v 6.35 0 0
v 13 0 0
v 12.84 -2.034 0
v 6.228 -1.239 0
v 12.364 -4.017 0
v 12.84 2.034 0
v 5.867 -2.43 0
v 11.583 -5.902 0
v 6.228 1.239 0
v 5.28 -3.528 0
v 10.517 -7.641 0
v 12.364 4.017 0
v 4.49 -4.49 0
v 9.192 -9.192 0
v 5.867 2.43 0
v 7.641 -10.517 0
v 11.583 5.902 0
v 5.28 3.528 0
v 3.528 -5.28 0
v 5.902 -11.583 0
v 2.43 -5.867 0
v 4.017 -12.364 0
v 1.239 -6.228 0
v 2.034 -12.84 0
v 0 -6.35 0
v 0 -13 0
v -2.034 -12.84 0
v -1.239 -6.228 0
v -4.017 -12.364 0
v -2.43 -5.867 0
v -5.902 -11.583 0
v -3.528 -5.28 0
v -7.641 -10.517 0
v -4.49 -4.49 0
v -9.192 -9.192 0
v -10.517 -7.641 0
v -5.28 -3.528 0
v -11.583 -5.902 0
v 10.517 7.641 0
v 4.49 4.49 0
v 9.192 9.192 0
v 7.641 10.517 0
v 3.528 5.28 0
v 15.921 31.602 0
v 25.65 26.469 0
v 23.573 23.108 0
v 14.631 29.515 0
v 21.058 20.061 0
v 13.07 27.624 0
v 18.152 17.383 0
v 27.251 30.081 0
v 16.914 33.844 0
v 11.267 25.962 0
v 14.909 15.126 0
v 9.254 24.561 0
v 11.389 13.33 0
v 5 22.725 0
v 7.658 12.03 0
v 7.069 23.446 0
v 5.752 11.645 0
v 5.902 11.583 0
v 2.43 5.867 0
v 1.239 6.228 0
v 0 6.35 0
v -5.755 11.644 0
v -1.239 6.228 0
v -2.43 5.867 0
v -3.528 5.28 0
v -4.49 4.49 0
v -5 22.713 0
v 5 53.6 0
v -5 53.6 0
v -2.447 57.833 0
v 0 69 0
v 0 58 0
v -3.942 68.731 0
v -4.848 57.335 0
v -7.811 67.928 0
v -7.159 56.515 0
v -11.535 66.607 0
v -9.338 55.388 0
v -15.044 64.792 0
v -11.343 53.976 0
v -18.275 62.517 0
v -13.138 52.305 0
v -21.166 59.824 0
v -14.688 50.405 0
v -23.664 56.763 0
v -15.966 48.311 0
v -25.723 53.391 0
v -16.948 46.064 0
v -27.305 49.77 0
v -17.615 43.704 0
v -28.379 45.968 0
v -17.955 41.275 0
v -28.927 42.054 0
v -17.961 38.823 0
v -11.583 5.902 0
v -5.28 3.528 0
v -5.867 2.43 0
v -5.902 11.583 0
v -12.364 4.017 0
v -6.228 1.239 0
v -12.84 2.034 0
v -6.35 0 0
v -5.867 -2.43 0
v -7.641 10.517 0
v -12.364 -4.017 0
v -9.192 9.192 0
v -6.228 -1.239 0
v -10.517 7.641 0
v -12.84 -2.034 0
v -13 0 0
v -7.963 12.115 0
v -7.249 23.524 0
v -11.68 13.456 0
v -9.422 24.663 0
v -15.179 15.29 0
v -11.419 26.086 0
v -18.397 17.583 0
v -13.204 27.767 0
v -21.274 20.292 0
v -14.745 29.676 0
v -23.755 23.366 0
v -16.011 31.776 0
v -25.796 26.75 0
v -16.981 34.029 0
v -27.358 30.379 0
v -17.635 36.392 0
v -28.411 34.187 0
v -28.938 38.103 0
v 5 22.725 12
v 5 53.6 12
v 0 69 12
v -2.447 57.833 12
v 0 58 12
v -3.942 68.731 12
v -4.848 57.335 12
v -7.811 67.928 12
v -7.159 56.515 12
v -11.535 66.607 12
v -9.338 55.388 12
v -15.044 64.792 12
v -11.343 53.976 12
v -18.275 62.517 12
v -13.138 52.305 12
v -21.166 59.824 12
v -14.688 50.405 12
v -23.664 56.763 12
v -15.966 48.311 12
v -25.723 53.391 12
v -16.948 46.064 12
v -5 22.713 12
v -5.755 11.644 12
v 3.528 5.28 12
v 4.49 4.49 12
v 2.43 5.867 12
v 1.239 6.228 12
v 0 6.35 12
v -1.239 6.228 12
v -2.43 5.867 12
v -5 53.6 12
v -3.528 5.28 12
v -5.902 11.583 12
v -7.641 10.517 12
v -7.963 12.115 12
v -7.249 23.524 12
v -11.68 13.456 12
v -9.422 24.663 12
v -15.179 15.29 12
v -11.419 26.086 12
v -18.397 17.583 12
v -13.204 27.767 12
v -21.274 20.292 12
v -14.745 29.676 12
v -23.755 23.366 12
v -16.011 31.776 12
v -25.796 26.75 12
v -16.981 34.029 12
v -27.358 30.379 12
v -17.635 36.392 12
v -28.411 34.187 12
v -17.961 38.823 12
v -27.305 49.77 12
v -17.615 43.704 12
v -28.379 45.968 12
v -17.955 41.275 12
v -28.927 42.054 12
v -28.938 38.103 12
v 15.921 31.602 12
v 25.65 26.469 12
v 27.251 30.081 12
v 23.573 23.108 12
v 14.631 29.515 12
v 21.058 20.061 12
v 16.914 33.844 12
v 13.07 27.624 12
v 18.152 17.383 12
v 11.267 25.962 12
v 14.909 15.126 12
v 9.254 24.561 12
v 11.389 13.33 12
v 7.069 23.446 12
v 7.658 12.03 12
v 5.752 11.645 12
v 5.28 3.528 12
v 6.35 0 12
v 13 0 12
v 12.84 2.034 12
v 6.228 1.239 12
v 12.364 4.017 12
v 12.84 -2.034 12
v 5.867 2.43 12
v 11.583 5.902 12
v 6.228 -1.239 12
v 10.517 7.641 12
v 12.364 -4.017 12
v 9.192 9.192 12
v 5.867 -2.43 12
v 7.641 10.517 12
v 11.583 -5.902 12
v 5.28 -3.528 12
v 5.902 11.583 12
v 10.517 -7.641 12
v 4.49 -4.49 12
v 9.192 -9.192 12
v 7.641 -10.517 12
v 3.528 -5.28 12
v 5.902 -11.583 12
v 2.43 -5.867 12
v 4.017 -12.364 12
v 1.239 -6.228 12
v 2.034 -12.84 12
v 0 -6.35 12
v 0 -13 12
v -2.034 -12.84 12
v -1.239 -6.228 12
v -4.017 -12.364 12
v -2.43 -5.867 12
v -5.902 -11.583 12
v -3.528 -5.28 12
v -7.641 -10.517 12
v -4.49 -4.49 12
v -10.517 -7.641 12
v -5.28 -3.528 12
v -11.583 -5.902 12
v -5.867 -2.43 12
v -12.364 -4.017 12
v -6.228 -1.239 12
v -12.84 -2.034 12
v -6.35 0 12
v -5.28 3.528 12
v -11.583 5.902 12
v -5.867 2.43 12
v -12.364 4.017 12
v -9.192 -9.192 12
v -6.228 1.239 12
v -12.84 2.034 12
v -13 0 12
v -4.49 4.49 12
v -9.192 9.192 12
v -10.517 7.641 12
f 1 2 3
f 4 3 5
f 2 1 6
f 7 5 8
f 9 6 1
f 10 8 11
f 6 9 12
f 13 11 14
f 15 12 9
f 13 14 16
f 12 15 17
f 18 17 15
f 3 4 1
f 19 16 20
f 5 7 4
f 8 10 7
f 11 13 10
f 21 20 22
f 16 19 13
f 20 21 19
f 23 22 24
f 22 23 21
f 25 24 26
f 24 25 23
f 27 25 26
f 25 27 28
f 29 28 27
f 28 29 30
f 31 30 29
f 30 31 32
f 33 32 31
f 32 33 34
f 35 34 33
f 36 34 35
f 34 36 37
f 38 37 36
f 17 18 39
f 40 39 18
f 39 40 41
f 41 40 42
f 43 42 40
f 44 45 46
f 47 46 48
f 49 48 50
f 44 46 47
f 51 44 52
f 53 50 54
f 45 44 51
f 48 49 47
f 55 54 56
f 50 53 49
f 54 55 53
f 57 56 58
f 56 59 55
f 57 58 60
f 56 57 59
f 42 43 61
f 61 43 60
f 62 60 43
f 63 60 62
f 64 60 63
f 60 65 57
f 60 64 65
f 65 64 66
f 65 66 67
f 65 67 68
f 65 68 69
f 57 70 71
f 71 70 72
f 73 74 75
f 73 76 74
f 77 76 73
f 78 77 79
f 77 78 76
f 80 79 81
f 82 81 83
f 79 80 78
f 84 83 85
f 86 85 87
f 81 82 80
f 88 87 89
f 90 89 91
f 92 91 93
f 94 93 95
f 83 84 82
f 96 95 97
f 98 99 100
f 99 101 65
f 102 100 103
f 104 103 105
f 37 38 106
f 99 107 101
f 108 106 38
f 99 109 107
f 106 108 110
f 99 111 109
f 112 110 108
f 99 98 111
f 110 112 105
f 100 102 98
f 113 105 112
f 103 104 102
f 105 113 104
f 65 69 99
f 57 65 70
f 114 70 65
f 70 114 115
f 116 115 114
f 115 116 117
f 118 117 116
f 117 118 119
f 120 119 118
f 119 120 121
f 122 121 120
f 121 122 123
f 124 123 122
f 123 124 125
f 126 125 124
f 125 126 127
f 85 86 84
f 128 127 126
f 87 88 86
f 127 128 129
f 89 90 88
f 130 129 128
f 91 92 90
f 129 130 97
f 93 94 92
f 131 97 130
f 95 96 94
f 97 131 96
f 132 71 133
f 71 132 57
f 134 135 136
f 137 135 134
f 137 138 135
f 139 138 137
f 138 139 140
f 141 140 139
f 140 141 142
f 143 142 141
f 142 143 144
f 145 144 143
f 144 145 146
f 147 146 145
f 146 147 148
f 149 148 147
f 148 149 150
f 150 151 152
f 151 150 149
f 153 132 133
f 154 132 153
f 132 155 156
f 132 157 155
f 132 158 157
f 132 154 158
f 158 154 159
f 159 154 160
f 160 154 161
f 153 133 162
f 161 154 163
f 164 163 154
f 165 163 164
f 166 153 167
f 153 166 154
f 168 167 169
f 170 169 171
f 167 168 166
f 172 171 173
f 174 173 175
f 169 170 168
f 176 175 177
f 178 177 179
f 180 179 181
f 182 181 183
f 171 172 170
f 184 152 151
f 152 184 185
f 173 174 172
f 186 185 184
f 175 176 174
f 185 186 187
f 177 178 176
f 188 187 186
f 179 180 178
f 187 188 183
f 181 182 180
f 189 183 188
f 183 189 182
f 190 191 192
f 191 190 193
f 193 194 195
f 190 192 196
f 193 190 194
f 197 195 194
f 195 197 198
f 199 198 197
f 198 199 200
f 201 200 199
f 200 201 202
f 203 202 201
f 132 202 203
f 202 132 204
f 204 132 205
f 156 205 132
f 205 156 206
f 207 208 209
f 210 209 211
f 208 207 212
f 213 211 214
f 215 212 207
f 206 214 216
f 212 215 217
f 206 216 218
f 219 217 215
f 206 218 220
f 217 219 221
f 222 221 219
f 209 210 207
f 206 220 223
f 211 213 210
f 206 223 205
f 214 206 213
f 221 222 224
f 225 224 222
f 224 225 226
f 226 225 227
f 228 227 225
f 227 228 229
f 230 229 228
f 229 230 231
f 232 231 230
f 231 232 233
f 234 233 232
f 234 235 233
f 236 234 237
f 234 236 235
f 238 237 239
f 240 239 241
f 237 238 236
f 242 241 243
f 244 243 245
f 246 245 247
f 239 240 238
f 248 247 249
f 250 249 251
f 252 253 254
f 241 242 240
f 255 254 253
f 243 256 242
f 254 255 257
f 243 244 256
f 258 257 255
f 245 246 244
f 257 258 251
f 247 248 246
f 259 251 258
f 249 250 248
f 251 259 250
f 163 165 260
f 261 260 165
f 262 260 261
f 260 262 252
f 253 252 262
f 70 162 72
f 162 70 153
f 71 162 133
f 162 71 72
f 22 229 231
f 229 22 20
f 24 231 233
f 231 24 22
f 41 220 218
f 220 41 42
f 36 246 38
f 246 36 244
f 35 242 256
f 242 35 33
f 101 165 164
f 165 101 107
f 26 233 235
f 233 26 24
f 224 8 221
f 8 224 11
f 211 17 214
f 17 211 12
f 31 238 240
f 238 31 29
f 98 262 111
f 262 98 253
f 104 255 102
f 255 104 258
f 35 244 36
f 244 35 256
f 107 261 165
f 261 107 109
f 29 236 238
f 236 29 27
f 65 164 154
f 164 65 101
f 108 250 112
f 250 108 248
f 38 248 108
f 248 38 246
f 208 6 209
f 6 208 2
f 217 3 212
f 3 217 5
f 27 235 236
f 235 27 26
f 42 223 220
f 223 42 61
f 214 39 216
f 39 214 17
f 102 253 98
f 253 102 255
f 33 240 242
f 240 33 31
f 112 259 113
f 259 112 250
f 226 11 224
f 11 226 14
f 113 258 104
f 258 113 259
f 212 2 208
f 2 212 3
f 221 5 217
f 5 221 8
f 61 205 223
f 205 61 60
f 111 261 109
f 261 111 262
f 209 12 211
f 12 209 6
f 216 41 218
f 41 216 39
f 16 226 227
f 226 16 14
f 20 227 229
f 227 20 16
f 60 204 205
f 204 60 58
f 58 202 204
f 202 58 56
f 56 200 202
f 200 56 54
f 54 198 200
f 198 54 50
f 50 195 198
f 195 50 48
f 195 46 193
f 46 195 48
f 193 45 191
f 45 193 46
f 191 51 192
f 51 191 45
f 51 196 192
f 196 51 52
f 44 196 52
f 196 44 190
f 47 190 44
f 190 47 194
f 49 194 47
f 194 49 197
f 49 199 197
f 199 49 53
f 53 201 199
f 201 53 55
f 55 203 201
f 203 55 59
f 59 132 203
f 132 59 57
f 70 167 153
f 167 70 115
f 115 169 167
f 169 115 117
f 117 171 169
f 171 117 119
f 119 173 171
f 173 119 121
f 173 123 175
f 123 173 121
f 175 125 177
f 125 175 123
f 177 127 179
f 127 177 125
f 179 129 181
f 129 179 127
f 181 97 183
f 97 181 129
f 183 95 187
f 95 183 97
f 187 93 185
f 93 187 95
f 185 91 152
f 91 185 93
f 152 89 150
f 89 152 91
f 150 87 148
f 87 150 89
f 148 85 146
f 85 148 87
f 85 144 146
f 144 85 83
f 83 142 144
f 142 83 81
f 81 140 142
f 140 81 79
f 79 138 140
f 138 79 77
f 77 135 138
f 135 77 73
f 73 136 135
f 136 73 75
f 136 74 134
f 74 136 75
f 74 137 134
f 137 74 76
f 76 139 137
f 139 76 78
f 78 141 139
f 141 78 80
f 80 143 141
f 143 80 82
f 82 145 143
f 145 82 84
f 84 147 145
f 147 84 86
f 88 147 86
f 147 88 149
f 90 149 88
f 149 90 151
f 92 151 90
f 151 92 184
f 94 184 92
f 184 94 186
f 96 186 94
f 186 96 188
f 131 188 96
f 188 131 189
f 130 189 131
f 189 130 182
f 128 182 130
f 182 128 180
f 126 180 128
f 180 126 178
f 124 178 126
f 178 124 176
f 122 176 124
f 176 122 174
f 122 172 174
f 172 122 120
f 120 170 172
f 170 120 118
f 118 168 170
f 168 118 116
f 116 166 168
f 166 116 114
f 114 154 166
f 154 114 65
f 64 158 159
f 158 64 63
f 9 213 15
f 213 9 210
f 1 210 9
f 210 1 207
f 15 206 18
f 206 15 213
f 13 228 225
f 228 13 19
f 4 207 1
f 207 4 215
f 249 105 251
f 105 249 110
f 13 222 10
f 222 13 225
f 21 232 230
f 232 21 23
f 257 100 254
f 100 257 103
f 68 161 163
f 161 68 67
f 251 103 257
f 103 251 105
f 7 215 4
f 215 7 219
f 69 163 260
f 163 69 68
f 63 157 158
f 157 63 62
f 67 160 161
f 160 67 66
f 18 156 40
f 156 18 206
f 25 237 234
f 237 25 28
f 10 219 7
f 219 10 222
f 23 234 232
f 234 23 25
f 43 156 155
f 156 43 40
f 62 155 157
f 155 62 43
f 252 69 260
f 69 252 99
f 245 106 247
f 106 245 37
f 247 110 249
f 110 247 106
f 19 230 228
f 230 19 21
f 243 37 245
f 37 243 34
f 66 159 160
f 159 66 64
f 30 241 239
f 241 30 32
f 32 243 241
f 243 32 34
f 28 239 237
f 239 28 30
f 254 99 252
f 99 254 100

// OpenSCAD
$fn = 32;

// ----------------------------------------------------------------------
// Hook: 80 mm shank into a 18 mm curl, 12 mm thick
// ----------------------------------------------------------------------

// --- parameters (mm) ---
shank_len = 80;           // shank length from the boss centre
shank_w = 10;             // shank width
boss_d = 26;              // boss diameter
bore_d = 12.7;            // boss bore
curl_in = 18;             // curl inner radius
curl_out = 29;            // curl outer radius
curl_sweep = 250;         // curl sweep angle
hook_t = 12;              // hook thickness

shank_profile = [[-5, 53.6], [5, 53.6], [5, 11], [-5, 11]];
boss_profile = [[13, 0], [12.84, 2.034], [12.364, 4.017], [11.583, 5.902], [10.517, 7.641], [9.192, 9.192], [7.641, 10.517], [5.902, 11.583], [4.017, 12.364], [2.034, 12.84], [0, 13], [-2.034, 12.84], [-4.017, 12.364], [-5.902, 11.583], [-7.641, 10.517], [-9.192, 9.192], [-10.517, 7.641], [-11.583, 5.902], [-12.364, 4.017], [-12.84, 2.034], [-13, 0], [-12.84, -2.034], [-12.364, -4.017], [-11.583, -5.902], [-10.517, -7.641], [-9.192, -9.192], [-7.641, -10.517], [-5.902, -11.583], [-4.017, -12.364], [-2.034, -12.84], [0, -13], [2.034, -12.84], [4.017, -12.364], [5.902, -11.583], [7.641, -10.517], [9.192, -9.192], [10.517, -7.641], [11.583, -5.902], [12.364, -4.017], [12.84, -2.034]];
curl_profile = [[0, 69], [-3.942, 68.731], [-7.811, 67.928], [-11.535, 66.607], [-15.044, 64.792], [-18.275, 62.517], [-21.166, 59.824], [-23.664, 56.763], [-25.723, 53.391], [-27.305, 49.77], [-28.379, 45.968], [-28.927, 42.054], [-28.938, 38.103], [-28.411, 34.187], [-27.358, 30.379], [-25.796, 26.75], [-23.755, 23.366], [-21.274, 20.292], [-18.397, 17.583], [-15.179, 15.29], [-11.68, 13.456], [-7.963, 12.115], [-4.099, 11.291], [-0.158, 11], [3.785, 11.248], [7.658, 12.03], [11.389, 13.33], [14.909, 15.126], [18.152, 17.383], [21.058, 20.061], [23.573, 23.108], [25.65, 26.469], [27.251, 30.081], [16.914, 33.844], [15.921, 31.602], [14.631, 29.515], [13.07, 27.624], [11.267, 25.962], [9.254, 24.561], [7.069, 23.446], [4.754, 22.639], [2.349, 22.154], [-0.098, 22], [-2.544, 22.181], [-4.943, 22.692], [-7.249, 23.524], [-9.422, 24.663], [-11.419, 26.086], [-13.204, 27.767], [-14.745, 29.676], [-16.011, 31.776], [-16.981, 34.029], [-17.635, 36.392], [-17.961, 38.823], [-17.955, 41.275], [-17.615, 43.704], [-16.948, 46.064], [-15.966, 48.311], [-14.688, 50.405], [-13.138, 52.305], [-11.343, 53.976], [-9.338, 55.388], [-7.159, 56.515], [-4.848, 57.335], [-2.447, 57.833], [0, 58]];

difference() {
  union() {
    /* three overlapping outlines: shank, boss and the smooth curl */
    linear_extrude(height = hook_t) polygon(shank_profile);
    linear_extrude(height = hook_t) polygon(boss_profile);
    linear_extrude(height = hook_t) polygon(curl_profile);
  }
  translate([0, 0, -2.5]) cylinder(h = hook_t + 5, d = bore_d);
}
